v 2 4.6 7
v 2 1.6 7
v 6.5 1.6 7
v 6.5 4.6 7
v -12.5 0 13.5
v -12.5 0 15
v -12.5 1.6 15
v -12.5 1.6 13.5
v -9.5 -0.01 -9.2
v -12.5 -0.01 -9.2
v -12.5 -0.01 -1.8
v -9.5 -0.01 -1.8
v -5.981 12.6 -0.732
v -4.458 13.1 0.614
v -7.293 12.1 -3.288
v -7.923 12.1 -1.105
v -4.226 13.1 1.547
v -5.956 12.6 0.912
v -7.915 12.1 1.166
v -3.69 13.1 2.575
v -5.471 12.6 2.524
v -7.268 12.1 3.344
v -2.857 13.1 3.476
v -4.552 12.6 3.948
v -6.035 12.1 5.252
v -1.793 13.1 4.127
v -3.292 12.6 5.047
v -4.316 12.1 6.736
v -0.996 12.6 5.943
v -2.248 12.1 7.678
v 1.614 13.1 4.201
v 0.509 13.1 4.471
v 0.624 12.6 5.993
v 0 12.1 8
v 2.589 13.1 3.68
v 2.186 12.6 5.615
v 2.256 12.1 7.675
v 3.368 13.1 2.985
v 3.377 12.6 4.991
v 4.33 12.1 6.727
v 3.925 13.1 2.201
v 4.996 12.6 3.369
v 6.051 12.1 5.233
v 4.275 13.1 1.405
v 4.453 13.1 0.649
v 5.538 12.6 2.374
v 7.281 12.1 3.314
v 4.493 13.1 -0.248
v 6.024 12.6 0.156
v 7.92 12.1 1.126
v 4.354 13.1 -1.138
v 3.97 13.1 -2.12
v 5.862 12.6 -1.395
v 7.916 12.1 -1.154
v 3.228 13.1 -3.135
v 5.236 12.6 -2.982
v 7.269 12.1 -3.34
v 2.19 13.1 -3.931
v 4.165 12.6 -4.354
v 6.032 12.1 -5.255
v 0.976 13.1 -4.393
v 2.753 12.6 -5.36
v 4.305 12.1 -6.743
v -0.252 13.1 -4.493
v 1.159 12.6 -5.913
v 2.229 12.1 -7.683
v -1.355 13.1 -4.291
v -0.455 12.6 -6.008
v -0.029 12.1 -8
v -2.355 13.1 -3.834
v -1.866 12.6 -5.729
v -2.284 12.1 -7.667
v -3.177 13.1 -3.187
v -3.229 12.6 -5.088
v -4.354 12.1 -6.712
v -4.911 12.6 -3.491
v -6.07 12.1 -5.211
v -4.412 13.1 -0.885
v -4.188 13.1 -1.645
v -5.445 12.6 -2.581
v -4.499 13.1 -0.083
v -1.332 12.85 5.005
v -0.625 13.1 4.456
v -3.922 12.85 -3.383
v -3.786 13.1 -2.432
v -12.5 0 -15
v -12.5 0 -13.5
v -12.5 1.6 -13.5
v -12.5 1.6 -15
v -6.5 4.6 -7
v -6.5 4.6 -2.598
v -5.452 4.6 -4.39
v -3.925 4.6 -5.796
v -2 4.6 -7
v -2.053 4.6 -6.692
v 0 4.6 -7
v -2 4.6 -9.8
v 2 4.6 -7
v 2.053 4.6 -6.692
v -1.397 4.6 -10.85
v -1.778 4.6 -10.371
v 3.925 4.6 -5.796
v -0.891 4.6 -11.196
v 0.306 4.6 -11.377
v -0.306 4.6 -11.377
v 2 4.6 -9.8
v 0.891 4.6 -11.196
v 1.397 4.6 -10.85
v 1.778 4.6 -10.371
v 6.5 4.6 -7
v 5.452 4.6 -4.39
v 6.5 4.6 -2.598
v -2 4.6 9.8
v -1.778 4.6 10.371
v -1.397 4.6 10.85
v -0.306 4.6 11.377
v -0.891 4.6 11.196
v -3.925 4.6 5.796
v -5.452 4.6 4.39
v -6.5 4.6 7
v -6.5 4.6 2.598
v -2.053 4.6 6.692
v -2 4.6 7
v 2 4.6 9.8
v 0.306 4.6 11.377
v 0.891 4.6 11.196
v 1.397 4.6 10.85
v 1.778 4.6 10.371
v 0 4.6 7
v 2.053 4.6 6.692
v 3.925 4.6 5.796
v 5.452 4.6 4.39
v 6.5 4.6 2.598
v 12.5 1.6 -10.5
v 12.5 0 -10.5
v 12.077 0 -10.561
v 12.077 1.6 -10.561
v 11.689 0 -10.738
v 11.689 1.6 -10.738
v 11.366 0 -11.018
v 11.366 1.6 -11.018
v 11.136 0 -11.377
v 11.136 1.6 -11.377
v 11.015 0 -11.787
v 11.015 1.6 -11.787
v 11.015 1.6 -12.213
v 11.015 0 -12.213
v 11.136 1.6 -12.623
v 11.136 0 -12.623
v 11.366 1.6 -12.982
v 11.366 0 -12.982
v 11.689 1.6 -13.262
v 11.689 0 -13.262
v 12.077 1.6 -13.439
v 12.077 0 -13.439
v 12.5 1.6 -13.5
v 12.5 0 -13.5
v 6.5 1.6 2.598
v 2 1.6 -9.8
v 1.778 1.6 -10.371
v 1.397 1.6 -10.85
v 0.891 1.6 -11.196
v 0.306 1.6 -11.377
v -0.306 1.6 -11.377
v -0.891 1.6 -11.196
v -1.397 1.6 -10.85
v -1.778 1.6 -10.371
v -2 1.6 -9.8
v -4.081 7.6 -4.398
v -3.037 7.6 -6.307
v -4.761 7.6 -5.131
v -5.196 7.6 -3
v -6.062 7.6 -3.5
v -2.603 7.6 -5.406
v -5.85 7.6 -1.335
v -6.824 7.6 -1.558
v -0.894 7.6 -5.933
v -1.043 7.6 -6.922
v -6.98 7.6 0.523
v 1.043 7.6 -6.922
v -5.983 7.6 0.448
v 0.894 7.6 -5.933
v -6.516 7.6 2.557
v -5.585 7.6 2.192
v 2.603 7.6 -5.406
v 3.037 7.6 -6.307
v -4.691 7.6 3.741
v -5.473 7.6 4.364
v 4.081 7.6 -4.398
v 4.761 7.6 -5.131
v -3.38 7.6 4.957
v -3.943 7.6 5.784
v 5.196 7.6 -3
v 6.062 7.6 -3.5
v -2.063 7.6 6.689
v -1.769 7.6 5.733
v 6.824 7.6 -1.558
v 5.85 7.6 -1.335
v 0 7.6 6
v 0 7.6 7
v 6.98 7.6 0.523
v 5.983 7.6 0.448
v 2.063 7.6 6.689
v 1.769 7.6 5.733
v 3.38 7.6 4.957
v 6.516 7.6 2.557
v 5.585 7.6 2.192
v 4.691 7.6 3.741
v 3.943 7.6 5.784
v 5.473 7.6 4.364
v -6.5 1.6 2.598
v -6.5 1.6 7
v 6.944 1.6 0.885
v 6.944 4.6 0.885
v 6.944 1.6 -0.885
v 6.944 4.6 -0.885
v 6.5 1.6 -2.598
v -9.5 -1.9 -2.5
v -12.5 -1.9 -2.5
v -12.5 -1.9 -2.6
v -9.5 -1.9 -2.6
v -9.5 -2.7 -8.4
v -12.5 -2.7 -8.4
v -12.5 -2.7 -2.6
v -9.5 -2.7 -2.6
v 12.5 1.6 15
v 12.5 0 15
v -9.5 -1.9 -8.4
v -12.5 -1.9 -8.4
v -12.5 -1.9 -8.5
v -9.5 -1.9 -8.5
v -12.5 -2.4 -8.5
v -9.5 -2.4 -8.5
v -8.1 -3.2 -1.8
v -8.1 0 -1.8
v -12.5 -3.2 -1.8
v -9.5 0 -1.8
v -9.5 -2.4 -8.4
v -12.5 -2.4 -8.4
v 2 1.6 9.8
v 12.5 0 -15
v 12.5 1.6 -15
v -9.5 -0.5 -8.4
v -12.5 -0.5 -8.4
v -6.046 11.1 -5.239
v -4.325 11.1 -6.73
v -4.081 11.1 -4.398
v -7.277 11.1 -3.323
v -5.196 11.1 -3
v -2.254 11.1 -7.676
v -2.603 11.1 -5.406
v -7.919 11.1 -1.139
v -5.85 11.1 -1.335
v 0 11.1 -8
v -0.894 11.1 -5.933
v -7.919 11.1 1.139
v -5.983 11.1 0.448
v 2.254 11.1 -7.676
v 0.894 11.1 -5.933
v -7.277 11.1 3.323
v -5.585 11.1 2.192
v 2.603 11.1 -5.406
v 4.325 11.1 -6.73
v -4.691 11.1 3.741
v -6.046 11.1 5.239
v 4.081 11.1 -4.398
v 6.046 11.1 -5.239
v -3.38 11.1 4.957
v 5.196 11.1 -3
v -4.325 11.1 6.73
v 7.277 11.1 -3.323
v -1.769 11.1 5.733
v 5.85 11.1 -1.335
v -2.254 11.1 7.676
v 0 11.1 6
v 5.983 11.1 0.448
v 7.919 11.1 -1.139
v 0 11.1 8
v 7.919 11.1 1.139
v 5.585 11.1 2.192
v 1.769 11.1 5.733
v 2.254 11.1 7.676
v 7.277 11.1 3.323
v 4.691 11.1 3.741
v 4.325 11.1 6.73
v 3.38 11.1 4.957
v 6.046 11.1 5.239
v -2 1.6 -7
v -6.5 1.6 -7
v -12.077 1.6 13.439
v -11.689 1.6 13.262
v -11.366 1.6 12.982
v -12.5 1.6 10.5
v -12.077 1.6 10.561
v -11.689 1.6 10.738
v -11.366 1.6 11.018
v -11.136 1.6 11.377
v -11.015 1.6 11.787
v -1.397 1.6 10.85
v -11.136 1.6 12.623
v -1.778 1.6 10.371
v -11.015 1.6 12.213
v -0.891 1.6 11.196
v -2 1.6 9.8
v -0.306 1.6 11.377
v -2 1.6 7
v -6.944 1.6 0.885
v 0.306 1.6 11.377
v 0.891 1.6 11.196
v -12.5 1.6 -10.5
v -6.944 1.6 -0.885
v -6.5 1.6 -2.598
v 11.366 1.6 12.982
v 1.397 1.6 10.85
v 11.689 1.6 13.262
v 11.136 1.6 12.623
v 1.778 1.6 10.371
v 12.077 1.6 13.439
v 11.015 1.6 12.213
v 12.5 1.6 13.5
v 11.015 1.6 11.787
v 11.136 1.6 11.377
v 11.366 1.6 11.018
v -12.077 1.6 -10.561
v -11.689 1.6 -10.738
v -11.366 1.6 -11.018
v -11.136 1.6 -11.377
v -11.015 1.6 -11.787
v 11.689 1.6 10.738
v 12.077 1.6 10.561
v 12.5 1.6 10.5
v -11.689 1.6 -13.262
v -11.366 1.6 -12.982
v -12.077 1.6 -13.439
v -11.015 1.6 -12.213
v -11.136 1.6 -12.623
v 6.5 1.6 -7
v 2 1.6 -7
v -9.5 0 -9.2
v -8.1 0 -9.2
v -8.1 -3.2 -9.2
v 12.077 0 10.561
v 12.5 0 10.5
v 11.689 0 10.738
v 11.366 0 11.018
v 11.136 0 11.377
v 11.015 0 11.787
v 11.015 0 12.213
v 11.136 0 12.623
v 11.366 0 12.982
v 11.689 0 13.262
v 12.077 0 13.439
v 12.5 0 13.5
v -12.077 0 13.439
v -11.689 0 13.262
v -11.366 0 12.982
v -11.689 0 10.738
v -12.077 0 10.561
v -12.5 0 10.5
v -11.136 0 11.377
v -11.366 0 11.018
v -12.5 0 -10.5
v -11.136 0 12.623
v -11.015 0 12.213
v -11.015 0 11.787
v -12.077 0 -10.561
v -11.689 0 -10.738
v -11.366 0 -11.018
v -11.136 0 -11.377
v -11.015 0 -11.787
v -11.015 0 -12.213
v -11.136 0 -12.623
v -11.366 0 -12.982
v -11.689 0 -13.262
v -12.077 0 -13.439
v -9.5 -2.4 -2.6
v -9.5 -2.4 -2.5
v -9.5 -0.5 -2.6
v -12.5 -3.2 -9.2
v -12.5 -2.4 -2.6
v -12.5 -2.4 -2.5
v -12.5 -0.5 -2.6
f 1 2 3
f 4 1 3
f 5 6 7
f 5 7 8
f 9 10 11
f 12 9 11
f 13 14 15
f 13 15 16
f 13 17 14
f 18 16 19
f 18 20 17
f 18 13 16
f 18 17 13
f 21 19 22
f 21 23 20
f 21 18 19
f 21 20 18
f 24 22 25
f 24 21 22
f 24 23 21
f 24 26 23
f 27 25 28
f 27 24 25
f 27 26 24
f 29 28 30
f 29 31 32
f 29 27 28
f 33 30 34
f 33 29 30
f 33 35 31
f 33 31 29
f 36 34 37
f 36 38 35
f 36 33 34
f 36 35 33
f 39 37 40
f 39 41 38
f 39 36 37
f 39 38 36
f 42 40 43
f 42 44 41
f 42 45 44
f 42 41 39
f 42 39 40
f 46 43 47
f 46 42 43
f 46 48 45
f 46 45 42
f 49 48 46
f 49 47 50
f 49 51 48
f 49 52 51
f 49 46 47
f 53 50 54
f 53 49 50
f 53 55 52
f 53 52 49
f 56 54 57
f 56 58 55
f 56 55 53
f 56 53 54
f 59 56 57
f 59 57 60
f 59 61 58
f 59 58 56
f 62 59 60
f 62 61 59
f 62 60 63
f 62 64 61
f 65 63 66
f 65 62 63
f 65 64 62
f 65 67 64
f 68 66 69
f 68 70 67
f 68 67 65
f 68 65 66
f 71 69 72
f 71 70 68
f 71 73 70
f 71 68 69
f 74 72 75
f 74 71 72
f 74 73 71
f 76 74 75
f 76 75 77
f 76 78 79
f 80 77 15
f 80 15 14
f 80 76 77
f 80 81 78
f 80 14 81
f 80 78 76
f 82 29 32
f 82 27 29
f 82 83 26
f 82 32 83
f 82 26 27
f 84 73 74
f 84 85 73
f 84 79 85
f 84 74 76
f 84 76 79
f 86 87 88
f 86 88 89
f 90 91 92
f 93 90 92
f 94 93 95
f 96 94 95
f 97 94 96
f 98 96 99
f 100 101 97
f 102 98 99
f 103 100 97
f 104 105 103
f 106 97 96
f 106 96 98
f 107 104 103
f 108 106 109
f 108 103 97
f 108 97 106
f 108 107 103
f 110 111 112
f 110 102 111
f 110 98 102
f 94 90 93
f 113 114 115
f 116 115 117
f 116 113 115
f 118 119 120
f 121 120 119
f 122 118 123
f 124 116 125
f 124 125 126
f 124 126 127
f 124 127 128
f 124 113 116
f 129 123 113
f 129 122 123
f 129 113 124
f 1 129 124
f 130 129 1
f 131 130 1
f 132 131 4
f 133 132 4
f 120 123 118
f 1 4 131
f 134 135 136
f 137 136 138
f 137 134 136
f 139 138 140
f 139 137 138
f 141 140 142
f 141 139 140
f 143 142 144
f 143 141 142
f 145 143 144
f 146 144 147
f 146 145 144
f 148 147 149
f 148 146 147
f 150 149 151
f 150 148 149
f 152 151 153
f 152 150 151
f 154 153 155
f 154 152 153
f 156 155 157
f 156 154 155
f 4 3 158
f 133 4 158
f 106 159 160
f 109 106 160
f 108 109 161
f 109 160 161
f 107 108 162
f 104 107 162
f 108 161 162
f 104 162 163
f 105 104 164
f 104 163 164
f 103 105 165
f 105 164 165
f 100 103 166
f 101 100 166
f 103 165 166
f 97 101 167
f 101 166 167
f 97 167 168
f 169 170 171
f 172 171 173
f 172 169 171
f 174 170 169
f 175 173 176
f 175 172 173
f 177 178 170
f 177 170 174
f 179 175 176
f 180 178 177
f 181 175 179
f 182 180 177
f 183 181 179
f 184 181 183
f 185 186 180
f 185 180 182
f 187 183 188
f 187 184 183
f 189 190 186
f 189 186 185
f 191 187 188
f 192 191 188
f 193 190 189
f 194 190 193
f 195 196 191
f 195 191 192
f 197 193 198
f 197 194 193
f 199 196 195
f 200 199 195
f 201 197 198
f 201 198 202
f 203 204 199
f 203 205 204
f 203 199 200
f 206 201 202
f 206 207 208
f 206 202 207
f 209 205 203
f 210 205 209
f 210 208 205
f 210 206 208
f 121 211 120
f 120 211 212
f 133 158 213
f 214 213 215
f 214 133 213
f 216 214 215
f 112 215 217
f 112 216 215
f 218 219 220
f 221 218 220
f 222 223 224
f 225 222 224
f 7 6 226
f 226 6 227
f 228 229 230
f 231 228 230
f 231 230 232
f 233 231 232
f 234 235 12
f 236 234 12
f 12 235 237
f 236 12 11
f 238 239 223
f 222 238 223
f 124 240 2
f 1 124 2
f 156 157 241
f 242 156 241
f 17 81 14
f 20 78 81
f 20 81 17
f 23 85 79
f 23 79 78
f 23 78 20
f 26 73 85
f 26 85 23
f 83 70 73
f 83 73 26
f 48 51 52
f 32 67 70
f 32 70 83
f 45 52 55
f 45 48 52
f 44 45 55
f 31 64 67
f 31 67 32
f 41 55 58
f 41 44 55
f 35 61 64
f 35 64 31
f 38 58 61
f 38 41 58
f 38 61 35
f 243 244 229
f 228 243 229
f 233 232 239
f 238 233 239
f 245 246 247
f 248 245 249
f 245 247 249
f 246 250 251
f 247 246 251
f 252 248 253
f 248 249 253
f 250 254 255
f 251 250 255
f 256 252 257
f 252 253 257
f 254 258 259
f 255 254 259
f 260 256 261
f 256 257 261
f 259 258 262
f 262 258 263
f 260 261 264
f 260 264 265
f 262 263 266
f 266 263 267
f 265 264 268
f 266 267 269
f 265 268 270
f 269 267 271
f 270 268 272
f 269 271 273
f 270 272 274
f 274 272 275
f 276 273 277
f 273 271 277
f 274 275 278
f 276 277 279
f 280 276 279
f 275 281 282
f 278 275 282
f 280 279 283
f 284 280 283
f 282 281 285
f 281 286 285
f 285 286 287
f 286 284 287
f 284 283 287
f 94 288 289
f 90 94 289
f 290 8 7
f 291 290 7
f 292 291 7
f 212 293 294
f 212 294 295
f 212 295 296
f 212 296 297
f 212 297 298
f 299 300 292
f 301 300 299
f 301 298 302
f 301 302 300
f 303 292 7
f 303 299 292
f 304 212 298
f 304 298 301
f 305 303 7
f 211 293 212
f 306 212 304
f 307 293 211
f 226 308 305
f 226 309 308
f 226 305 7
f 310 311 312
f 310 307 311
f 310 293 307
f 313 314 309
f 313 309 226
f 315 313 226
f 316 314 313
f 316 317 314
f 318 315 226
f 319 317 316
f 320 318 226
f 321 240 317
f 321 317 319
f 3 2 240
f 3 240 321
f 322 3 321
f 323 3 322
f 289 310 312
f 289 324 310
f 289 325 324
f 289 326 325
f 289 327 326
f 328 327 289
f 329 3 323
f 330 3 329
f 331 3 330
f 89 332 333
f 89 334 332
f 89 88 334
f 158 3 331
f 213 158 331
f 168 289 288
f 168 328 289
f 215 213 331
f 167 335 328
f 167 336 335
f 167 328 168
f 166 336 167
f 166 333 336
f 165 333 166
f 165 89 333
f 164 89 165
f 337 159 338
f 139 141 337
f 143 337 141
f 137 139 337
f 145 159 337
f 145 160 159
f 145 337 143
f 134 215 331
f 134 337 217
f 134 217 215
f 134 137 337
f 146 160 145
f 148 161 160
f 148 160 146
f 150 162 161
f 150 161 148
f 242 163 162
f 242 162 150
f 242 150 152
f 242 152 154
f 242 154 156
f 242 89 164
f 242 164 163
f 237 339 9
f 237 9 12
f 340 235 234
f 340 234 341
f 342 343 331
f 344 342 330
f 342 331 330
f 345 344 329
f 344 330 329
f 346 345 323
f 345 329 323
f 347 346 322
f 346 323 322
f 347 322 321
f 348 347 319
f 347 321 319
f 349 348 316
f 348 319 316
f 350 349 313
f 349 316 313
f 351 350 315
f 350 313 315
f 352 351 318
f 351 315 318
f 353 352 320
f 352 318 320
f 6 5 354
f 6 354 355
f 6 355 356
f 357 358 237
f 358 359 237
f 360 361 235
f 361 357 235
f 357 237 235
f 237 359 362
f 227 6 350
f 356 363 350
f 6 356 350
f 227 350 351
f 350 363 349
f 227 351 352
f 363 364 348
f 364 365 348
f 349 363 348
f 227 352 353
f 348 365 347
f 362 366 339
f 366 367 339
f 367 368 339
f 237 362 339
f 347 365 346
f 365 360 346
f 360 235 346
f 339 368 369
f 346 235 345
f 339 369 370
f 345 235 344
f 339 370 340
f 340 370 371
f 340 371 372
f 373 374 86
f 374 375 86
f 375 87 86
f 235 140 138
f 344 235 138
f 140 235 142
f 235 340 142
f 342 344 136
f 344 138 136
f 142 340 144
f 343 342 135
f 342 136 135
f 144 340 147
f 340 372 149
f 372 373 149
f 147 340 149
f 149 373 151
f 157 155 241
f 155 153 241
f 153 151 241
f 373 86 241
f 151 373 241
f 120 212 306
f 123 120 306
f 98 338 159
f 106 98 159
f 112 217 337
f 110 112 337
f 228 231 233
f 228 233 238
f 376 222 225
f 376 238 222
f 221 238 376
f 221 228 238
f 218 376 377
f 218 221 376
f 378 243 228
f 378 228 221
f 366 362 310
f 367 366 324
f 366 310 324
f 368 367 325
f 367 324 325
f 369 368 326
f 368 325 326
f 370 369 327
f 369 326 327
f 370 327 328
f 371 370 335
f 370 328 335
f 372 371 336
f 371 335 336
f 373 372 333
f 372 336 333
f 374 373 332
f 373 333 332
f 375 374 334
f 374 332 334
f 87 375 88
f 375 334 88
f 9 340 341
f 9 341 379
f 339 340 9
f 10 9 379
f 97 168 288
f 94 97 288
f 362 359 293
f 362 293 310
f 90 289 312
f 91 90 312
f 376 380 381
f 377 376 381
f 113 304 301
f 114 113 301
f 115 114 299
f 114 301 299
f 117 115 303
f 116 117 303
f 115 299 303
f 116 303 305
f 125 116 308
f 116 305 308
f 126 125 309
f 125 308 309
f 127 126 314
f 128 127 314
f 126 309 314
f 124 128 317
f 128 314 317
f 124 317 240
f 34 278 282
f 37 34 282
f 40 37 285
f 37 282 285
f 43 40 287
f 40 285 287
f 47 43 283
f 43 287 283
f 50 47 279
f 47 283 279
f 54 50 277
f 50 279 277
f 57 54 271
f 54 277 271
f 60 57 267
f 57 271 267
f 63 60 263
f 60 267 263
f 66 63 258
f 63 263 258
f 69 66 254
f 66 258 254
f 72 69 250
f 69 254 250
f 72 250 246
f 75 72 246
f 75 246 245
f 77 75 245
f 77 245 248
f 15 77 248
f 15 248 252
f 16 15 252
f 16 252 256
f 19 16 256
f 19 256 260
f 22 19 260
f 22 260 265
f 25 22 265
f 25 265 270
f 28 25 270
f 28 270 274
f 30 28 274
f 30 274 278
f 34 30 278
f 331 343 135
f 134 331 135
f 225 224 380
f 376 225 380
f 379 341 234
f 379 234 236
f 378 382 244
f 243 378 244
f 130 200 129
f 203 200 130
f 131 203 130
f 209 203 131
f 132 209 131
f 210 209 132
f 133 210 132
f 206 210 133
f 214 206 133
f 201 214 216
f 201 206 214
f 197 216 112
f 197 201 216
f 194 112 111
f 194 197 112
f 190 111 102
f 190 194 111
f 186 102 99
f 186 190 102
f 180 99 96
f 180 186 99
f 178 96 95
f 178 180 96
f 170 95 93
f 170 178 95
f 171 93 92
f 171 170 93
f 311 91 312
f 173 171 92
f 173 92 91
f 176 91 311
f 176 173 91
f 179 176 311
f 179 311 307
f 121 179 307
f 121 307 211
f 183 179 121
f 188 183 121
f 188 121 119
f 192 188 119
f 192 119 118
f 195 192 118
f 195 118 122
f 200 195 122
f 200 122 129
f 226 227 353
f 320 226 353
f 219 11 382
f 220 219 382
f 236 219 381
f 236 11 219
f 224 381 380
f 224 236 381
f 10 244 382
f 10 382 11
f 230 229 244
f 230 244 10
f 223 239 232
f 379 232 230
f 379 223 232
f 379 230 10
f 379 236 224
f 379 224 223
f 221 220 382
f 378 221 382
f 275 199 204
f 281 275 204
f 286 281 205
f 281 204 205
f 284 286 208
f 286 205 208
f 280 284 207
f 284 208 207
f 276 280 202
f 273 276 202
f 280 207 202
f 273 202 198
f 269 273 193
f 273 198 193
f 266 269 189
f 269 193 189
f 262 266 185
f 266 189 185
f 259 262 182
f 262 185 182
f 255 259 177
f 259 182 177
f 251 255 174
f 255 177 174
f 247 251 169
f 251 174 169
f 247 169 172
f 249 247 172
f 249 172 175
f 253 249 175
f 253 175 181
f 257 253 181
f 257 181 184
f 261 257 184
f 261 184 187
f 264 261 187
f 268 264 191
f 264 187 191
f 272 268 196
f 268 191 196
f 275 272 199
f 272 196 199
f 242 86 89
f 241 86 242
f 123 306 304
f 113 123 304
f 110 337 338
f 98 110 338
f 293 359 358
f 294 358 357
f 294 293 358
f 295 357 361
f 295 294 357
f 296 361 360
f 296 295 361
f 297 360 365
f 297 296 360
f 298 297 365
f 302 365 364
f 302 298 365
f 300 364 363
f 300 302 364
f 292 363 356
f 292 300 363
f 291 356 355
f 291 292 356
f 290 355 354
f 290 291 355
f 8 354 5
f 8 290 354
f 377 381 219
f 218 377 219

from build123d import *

# Parameters (mm, degrees)
SKETCH1_W               = 25
SKETCH1_H               = 30
BOSS_EXTRUDE1_DEPTH     = 1.6
BOSS_EXTRUDE2_DEPTH     = 3
SKETCH3_R               = 7
BOSS_EXTRUDE3_DEPTH     = 3
BOSS_EXTRUDE4_START     = 3
SKETCH4_R               = 7
BOSS_EXTRUDE4_DEPTH     = 3
SKETCH5_R               = 6
BOSS_EXTRUDE5_DEPTH     = 3.5
SKETCH6_R               = 8
BOSS_EXTRUDE6_DEPTH     = 1
SKETCH10_R              = 1.5
CUT_EXTRUDE1_DEPTH      = 2
MIRROR2_COPY_1_SKETCH_R = 1.5
MIRROR2_COPY_1_DEPTH    = 2
SKETCH11_W              = 4.4
SKETCH11_H              = 7.4
BOSS_EXTRUDE7_DEPTH     = 3.2
CUT_EXTRUDE2_DEPTH      = 3
SKETCH13_W              = 7.4
SKETCH13_H              = 0.01
CUT_EXTRUDE3_DEPTH      = 3


with BuildPart() as part:
    # Sketch1 → Boss-Extrude1 (new body)
    with BuildSketch(Plane(origin=(0, 0, 0), x_dir=(1, 0, 0), z_dir=(0, 1, 0))):
        Rectangle(SKETCH1_W, SKETCH1_H)
    extrude(amount=BOSS_EXTRUDE1_DEPTH)

    # Sketch2 → Boss-Extrude2 (add)
    with BuildSketch(Plane(origin=(0, 1.6, 0), x_dir=(1, 0, 0), z_dir=(0, 1, 0))):
        with BuildLine():
            Line((2, -9.8), (2, -7))
            Line((2, -7), (6.5, -7))
            Line((6.5, -7), (6.5, 7))
            Line((6.5, 7), (2, 7))
            Line((2, 7), (2, 9.8))
            ThreePointArc((2, 9.8), (0, 11.4), (-2, 9.8))
            Line((-2, 9.8), (-2, 7))
            Line((-2, 7), (-6.5, 7))
            Line((-6.5, 7), (-6.5, -7))
            Line((-6.5, -7), (-2, -7))
            Line((-2, -7), (-2, -9.8))
            ThreePointArc((-2, -9.8), (0, -11.4), (2, -9.8))
        make_face()
    extrude(amount=BOSS_EXTRUDE2_DEPTH)

    # Sketch3 → Boss-Extrude3 (add)
    with BuildSketch(Plane(origin=(0, 4.6, 0), x_dir=(1, 0, 0), z_dir=(0, 1, 0))):
        Circle(SKETCH3_R)
    extrude(amount=-BOSS_EXTRUDE3_DEPTH)

    # Sketch4 → Boss-Extrude4 (add)
    with BuildSketch(Plane(origin=(0, 4.6, 0), x_dir=(1, 0, 0), z_dir=(0, 1, 0)).offset(BOSS_EXTRUDE4_START)):
        with Locations(Location((0, 0, 0), (0, 0, 270))):
            Circle(SKETCH4_R)
    extrude(amount=-BOSS_EXTRUDE4_DEPTH)

    # Sketch5 → Boss-Extrude5 (add)
    with BuildSketch(Plane(origin=(0, 7.6, 0), x_dir=(1, 0, 0), z_dir=(0, 1, 0))):
        with Locations(Location((0, 0, 0), (0, 0, 270))):
            Circle(SKETCH5_R)
    extrude(amount=BOSS_EXTRUDE5_DEPTH)

    # Sketch6 → Boss-Extrude6 (add)
    with BuildSketch(Plane(origin=(0, 11.1, 0), x_dir=(1, 0, 0), z_dir=(0, 1, 0))):
        with Locations(Location((0, 0, 0), (0, 0, 270))):
            Circle(SKETCH6_R)
    extrude(amount=BOSS_EXTRUDE6_DEPTH)

    # Loft1: read off the stored shape, not the designer's step
    # Loft1: loft between two sections, ruled curve by curve
    loft1_from = [
        Edge.make_bspline([(-7.29329327, 12.1, -3.287533007), (-13.868359284, 12.1, 11.299053534), (0.718227257, 12.1, 17.874119548), (7.29329327, 12.1, 3.287533007), (13.868359284, 12.1, -11.299053534), (-0.718227257, 12.1, -17.874119548), (-7.29329327, 12.1, -3.287533007)], [0, 0, 0, 0, 0.5, 0.5, 0.5, 1, 1, 1, 1], 3, [1, 0.333333333, 0.333333333, 1, 0.333333333, 0.333333333, 1]),
    ]
    loft1_to = [
        Edge.make_bspline([(-4.457852082, 13.1, 0.614454893), (-3.228942297, 13.1, 9.530159057), (5.686761867, 13.1, 8.301249271), (4.457852082, 13.1, -0.614454893), (3.228942297, 13.1, -9.530159057), (-5.686761867, 13.1, -8.301249271), (-4.457852082, 13.1, 0.614454893)], [0, 0, 0, 0, 0.5, 0.5, 0.5, 1, 1, 1, 1], 3, [1, 0.333333333, 0.333333333, 1, 0.333333333, 0.333333333, 1]),
    ]
    loft1 = Solid(Shell([*[Face.make_surface_from_curves(loft1_from[k], loft1_to[k]) for k in range(1)], Face(Wire(loft1_from)), Face(Wire(loft1_to))]))
    add(loft1)

    # Sketch10 → Cut-Extrude1 (cut)
    with BuildSketch(Plane(origin=(0, 1.6, 0), x_dir=(1, 0, 0), z_dir=(0, 1, 0))):
        with Locations((12.5, -12)):
            Circle(SKETCH10_R)
    cut_extrude1 = extrude(amount=-CUT_EXTRUDE1_DEPTH, mode=Mode.SUBTRACT)

    # Mirror1: Cut-Extrude1 across plane
    add(cut_extrude1.mirror(Plane.ZY), mode=Mode.SUBTRACT)

    # Mirror2: Cut-Extrude1 across plane
    add(cut_extrude1.mirror(Plane.XY), mode=Mode.SUBTRACT)

    # Mirror2 copy 1 sketch → Mirror2 copy 1 (cut)
    with BuildSketch(Plane(origin=(0, 1.6, 0), x_dir=(-1, 0, 0), z_dir=(0, 1, 0))):
        with Locations((12.5, -12)):
            Circle(MIRROR2_COPY_1_SKETCH_R)
    extrude(amount=-MIRROR2_COPY_1_DEPTH, mode=Mode.SUBTRACT)

    # Sketch11 → Boss-Extrude7 (add)
    with BuildSketch(Plane(origin=(0, 0, 0), x_dir=(-1, 0, 0), z_dir=(0, -1, 0))):
        with Locations((10.3, 5.5)):
            Rectangle(SKETCH11_W, SKETCH11_H)
    extrude(amount=BOSS_EXTRUDE7_DEPTH)

    # Sketch12 → Cut-Extrude2 (cut)
    with BuildSketch(Plane.ZY.offset(12.5)):
        Polygon((-8.4, -2.7), (-2.6, -2.7), (-2.6, -2.4), (-2.5, -2.4), (-2.5, -1.9), (-2.6, -1.9), (-2.6, -0.5), (-8.4, -0.5), (-8.4, -1.9), (-8.5, -1.9), (-8.5, -2.4), (-8.4, -2.4), align=None)
    extrude(amount=-CUT_EXTRUDE2_DEPTH, mode=Mode.SUBTRACT)

    # Sketch13 → Cut-Extrude3 (cut)
    with BuildSketch(Plane.ZY.offset(12.5)):
        with Locations((-5.5, -0.005)):
            Rectangle(SKETCH13_W, SKETCH13_H)
    extrude(amount=-CUT_EXTRUDE3_DEPTH, mode=Mode.SUBTRACT)


solid = part.part
